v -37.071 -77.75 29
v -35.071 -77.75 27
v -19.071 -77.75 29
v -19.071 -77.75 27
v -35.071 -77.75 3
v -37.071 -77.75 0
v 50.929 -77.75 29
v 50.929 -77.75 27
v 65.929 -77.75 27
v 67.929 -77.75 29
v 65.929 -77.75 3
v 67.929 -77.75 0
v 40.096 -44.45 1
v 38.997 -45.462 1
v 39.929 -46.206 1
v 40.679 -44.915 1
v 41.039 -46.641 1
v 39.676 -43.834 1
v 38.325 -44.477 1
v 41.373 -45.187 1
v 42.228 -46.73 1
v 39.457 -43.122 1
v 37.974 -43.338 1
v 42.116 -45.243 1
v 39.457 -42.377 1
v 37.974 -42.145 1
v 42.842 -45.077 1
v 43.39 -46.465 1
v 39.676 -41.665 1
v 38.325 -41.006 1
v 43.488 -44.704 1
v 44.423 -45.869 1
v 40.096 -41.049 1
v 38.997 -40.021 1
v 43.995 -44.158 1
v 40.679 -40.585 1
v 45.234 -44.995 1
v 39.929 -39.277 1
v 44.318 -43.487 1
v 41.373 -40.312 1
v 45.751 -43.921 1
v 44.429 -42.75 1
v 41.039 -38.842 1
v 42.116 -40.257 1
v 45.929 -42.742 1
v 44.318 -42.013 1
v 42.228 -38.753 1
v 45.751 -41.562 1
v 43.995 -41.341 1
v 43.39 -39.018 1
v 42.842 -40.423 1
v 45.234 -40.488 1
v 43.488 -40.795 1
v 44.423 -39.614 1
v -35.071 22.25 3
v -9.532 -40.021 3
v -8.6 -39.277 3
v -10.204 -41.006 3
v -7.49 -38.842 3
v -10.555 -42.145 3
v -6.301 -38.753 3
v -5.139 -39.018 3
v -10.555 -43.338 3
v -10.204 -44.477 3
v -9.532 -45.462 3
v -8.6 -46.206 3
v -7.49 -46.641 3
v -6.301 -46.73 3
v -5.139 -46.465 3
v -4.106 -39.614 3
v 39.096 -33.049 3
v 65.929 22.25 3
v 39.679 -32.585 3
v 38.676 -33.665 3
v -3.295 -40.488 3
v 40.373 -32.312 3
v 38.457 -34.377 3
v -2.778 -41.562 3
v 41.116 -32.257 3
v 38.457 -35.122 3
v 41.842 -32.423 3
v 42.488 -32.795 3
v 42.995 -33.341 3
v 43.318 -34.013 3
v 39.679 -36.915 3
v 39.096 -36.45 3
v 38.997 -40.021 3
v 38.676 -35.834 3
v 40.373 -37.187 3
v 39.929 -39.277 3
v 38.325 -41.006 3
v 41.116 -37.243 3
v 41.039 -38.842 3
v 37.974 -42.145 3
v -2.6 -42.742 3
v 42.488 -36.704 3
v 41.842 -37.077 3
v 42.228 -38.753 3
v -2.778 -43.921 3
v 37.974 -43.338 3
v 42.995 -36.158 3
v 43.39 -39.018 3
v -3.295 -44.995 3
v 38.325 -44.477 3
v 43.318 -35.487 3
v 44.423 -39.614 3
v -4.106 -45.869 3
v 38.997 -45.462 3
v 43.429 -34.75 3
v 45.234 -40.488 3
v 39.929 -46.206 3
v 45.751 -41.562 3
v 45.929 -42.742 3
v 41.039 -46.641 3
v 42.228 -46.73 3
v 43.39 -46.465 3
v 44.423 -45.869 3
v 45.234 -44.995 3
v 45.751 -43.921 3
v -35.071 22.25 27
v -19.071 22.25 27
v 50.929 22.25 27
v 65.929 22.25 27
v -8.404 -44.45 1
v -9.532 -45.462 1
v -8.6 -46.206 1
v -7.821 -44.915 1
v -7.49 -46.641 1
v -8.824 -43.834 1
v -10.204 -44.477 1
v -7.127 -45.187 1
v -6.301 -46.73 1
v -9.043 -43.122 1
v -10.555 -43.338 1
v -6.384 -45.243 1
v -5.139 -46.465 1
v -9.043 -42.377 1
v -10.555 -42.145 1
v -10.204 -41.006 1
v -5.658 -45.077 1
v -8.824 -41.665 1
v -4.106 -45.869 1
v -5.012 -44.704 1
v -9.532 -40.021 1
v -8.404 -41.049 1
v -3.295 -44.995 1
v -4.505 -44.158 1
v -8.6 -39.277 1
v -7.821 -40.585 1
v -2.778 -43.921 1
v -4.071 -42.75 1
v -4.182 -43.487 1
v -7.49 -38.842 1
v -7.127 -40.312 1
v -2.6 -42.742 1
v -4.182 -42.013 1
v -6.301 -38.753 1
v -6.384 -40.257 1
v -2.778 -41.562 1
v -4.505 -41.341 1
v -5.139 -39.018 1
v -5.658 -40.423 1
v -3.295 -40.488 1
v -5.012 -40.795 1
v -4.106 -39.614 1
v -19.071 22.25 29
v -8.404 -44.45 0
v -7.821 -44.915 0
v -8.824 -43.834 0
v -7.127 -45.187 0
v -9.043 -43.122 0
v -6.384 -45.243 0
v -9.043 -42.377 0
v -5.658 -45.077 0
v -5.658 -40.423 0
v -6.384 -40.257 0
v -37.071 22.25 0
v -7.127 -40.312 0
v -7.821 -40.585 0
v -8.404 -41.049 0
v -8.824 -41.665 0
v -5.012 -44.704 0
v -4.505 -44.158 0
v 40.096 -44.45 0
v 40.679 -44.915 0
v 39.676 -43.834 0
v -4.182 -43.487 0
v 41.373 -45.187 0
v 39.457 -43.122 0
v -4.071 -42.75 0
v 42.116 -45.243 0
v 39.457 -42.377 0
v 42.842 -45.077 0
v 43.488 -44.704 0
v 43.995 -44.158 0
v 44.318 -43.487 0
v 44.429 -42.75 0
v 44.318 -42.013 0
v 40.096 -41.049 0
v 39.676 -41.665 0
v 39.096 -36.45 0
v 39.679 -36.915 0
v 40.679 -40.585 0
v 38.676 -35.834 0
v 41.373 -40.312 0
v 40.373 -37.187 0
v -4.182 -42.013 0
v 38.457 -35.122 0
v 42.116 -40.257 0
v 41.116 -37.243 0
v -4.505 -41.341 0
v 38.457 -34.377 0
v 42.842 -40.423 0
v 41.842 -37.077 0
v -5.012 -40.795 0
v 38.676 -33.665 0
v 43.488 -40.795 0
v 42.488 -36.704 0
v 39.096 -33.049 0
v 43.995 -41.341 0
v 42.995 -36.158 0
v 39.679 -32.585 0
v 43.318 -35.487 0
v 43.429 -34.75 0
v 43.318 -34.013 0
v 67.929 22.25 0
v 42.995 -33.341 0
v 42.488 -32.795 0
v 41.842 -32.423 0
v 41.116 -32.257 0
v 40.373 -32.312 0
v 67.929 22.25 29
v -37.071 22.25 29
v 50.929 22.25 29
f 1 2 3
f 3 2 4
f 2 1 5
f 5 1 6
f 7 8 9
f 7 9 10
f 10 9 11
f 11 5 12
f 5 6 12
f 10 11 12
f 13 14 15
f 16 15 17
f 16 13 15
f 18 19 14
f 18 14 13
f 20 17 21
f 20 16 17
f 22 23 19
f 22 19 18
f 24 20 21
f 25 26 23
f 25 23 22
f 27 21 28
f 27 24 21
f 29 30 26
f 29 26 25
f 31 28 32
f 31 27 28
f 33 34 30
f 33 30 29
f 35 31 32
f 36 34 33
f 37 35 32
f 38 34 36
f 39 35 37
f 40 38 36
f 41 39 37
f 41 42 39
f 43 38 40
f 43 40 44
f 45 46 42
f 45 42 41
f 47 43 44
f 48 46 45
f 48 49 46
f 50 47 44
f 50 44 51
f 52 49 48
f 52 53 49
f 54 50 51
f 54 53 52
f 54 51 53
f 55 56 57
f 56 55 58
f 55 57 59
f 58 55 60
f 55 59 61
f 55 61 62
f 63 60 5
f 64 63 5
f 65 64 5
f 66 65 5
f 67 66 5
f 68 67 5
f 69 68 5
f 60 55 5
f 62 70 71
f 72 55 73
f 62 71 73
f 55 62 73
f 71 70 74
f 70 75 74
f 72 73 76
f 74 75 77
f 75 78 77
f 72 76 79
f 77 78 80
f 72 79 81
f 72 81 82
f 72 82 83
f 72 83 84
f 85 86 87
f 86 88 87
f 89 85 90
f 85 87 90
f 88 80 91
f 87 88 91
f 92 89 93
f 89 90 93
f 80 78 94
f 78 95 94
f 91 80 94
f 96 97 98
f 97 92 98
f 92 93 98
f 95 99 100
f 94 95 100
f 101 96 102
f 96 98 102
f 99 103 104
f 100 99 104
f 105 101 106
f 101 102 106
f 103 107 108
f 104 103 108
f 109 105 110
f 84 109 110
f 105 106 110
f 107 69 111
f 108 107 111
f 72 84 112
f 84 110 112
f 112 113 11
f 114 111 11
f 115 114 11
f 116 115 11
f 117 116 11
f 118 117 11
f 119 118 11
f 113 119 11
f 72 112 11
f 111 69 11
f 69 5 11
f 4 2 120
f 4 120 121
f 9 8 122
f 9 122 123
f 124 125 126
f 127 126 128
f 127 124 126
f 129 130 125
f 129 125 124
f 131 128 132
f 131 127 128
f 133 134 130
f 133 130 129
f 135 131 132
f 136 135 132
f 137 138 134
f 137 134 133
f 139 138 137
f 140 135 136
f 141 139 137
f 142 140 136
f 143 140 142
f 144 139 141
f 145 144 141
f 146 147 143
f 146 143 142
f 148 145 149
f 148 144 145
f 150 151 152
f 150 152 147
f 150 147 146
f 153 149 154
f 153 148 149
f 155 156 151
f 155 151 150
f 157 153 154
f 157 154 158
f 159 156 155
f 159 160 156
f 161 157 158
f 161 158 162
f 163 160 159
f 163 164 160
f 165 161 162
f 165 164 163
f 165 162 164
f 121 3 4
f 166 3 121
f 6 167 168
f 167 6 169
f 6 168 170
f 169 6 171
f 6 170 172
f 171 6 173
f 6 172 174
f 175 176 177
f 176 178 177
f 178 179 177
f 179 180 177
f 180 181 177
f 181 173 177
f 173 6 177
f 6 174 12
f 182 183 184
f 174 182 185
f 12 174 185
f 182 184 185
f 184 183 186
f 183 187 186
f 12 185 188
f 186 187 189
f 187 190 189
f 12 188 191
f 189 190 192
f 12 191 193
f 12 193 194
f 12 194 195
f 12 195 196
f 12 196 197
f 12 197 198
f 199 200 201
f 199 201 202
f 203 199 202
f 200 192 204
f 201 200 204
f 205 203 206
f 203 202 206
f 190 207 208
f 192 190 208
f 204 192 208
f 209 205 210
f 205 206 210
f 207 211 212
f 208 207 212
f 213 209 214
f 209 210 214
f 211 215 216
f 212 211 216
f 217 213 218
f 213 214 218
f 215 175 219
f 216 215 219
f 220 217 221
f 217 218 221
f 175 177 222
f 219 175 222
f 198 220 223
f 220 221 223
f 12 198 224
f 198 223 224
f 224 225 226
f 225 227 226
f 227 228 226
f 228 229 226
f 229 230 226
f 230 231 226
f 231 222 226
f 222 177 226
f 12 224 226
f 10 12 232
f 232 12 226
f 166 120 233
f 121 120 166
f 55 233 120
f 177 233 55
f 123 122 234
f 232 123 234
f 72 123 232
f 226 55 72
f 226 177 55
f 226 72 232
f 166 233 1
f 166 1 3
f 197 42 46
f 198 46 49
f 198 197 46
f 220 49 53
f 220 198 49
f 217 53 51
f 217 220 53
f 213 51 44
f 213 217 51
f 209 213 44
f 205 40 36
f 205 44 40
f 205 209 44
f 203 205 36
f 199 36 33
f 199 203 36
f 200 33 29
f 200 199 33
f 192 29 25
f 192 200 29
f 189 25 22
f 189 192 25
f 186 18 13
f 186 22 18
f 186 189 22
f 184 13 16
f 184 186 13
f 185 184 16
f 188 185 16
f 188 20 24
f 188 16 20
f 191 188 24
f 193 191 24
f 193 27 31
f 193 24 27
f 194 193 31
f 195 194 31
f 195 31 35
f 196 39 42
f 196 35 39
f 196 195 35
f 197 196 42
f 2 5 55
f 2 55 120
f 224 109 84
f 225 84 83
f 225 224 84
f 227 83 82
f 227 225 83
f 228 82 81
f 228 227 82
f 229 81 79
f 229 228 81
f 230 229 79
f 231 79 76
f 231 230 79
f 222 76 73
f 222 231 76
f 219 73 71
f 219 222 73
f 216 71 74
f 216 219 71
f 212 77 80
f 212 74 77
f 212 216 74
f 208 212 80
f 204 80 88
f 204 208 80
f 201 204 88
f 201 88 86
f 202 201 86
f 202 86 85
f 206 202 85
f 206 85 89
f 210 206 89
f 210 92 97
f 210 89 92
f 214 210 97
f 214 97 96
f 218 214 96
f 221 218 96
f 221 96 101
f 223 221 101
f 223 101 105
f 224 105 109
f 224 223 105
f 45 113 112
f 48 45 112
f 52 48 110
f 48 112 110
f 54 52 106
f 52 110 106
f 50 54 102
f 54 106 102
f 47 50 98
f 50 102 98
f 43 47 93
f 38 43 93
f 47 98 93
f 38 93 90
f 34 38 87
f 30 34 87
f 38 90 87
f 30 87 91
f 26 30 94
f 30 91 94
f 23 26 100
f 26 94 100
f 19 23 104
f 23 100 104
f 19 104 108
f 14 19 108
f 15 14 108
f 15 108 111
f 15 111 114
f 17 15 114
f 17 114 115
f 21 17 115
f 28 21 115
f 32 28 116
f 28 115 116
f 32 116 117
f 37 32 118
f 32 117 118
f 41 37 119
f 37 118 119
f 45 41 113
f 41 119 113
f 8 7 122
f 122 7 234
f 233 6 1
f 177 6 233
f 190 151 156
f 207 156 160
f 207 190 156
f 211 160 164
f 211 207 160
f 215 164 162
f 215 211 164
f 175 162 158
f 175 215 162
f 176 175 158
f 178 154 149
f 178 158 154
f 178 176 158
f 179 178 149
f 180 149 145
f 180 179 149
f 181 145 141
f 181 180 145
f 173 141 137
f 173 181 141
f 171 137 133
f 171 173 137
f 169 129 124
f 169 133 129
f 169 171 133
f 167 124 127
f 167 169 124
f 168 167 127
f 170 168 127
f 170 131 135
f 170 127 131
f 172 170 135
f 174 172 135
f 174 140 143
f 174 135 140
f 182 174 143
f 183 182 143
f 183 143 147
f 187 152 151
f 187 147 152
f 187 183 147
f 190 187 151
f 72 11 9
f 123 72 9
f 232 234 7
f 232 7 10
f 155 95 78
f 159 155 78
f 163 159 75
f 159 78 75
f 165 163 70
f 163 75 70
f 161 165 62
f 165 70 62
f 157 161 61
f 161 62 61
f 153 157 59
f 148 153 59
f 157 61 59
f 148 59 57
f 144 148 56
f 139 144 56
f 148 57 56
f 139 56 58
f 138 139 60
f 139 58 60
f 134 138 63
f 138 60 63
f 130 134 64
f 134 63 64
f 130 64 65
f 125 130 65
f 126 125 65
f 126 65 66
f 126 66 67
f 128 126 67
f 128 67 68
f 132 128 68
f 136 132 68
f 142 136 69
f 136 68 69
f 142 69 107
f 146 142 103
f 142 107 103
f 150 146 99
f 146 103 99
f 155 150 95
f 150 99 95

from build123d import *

# Parameters (mm, degrees)
F0_W     = 105
F0_H     = 100
F1_DEPTH = 29
F2_W     = 101
F2_H     = 24
F3_DEPTH = 110
F4_W     = 70
F4_H     = 100
F5_DEPTH = 5
F6_R     = 2.5
F7_DEPTH = 5
F8_R     = 4
F9_DEPTH = 2


with BuildPart() as f1:
    # F0 (on Top) → F1 (new body)
    with BuildSketch(Plane.XY):
        with Locations((15.428911, -27.749735)):
            Rectangle(F0_W, F0_H)
    extrude(amount=F1_DEPTH)

    # F2 (on face) → F3 (cut)
    with BuildSketch(Plane.XZ.offset(77.749735)):
        with Locations((15.428911, 15)):
            Rectangle(F2_W, F2_H)
    extrude(amount=-F3_DEPTH, mode=Mode.SUBTRACT)

    # F4 (on face) → F5 (cut)
    with BuildSketch(Plane.XY.offset(29)):
        with Locations((15.928911, -27.749735)):
            Rectangle(F4_W, F4_H)
    extrude(amount=-F5_DEPTH, mode=Mode.SUBTRACT)

    # F6 (on Top) → F7 (cut)
    with BuildSketch(Plane.XY):
        with Locations((40.928911, -34.749735)):
            Circle(F6_R)
        with Locations((41.928911, -42.749736)):
            Circle(F6_R)
        with Locations((-6.571089, -42.749736)):
            Circle(F6_R)
    extrude(amount=F7_DEPTH, mode=Mode.SUBTRACT)

    # F8 (on face) → F9 (cut)
    with BuildSketch(Plane.XY.offset(3)):
        with Locations((41.928911, -42.741511)):
            Circle(F8_R)
        with Locations((-6.599996, -42.741511)):
            Circle(F8_R)
    extrude(amount=-F9_DEPTH, mode=Mode.SUBTRACT)


solid = f1.part
